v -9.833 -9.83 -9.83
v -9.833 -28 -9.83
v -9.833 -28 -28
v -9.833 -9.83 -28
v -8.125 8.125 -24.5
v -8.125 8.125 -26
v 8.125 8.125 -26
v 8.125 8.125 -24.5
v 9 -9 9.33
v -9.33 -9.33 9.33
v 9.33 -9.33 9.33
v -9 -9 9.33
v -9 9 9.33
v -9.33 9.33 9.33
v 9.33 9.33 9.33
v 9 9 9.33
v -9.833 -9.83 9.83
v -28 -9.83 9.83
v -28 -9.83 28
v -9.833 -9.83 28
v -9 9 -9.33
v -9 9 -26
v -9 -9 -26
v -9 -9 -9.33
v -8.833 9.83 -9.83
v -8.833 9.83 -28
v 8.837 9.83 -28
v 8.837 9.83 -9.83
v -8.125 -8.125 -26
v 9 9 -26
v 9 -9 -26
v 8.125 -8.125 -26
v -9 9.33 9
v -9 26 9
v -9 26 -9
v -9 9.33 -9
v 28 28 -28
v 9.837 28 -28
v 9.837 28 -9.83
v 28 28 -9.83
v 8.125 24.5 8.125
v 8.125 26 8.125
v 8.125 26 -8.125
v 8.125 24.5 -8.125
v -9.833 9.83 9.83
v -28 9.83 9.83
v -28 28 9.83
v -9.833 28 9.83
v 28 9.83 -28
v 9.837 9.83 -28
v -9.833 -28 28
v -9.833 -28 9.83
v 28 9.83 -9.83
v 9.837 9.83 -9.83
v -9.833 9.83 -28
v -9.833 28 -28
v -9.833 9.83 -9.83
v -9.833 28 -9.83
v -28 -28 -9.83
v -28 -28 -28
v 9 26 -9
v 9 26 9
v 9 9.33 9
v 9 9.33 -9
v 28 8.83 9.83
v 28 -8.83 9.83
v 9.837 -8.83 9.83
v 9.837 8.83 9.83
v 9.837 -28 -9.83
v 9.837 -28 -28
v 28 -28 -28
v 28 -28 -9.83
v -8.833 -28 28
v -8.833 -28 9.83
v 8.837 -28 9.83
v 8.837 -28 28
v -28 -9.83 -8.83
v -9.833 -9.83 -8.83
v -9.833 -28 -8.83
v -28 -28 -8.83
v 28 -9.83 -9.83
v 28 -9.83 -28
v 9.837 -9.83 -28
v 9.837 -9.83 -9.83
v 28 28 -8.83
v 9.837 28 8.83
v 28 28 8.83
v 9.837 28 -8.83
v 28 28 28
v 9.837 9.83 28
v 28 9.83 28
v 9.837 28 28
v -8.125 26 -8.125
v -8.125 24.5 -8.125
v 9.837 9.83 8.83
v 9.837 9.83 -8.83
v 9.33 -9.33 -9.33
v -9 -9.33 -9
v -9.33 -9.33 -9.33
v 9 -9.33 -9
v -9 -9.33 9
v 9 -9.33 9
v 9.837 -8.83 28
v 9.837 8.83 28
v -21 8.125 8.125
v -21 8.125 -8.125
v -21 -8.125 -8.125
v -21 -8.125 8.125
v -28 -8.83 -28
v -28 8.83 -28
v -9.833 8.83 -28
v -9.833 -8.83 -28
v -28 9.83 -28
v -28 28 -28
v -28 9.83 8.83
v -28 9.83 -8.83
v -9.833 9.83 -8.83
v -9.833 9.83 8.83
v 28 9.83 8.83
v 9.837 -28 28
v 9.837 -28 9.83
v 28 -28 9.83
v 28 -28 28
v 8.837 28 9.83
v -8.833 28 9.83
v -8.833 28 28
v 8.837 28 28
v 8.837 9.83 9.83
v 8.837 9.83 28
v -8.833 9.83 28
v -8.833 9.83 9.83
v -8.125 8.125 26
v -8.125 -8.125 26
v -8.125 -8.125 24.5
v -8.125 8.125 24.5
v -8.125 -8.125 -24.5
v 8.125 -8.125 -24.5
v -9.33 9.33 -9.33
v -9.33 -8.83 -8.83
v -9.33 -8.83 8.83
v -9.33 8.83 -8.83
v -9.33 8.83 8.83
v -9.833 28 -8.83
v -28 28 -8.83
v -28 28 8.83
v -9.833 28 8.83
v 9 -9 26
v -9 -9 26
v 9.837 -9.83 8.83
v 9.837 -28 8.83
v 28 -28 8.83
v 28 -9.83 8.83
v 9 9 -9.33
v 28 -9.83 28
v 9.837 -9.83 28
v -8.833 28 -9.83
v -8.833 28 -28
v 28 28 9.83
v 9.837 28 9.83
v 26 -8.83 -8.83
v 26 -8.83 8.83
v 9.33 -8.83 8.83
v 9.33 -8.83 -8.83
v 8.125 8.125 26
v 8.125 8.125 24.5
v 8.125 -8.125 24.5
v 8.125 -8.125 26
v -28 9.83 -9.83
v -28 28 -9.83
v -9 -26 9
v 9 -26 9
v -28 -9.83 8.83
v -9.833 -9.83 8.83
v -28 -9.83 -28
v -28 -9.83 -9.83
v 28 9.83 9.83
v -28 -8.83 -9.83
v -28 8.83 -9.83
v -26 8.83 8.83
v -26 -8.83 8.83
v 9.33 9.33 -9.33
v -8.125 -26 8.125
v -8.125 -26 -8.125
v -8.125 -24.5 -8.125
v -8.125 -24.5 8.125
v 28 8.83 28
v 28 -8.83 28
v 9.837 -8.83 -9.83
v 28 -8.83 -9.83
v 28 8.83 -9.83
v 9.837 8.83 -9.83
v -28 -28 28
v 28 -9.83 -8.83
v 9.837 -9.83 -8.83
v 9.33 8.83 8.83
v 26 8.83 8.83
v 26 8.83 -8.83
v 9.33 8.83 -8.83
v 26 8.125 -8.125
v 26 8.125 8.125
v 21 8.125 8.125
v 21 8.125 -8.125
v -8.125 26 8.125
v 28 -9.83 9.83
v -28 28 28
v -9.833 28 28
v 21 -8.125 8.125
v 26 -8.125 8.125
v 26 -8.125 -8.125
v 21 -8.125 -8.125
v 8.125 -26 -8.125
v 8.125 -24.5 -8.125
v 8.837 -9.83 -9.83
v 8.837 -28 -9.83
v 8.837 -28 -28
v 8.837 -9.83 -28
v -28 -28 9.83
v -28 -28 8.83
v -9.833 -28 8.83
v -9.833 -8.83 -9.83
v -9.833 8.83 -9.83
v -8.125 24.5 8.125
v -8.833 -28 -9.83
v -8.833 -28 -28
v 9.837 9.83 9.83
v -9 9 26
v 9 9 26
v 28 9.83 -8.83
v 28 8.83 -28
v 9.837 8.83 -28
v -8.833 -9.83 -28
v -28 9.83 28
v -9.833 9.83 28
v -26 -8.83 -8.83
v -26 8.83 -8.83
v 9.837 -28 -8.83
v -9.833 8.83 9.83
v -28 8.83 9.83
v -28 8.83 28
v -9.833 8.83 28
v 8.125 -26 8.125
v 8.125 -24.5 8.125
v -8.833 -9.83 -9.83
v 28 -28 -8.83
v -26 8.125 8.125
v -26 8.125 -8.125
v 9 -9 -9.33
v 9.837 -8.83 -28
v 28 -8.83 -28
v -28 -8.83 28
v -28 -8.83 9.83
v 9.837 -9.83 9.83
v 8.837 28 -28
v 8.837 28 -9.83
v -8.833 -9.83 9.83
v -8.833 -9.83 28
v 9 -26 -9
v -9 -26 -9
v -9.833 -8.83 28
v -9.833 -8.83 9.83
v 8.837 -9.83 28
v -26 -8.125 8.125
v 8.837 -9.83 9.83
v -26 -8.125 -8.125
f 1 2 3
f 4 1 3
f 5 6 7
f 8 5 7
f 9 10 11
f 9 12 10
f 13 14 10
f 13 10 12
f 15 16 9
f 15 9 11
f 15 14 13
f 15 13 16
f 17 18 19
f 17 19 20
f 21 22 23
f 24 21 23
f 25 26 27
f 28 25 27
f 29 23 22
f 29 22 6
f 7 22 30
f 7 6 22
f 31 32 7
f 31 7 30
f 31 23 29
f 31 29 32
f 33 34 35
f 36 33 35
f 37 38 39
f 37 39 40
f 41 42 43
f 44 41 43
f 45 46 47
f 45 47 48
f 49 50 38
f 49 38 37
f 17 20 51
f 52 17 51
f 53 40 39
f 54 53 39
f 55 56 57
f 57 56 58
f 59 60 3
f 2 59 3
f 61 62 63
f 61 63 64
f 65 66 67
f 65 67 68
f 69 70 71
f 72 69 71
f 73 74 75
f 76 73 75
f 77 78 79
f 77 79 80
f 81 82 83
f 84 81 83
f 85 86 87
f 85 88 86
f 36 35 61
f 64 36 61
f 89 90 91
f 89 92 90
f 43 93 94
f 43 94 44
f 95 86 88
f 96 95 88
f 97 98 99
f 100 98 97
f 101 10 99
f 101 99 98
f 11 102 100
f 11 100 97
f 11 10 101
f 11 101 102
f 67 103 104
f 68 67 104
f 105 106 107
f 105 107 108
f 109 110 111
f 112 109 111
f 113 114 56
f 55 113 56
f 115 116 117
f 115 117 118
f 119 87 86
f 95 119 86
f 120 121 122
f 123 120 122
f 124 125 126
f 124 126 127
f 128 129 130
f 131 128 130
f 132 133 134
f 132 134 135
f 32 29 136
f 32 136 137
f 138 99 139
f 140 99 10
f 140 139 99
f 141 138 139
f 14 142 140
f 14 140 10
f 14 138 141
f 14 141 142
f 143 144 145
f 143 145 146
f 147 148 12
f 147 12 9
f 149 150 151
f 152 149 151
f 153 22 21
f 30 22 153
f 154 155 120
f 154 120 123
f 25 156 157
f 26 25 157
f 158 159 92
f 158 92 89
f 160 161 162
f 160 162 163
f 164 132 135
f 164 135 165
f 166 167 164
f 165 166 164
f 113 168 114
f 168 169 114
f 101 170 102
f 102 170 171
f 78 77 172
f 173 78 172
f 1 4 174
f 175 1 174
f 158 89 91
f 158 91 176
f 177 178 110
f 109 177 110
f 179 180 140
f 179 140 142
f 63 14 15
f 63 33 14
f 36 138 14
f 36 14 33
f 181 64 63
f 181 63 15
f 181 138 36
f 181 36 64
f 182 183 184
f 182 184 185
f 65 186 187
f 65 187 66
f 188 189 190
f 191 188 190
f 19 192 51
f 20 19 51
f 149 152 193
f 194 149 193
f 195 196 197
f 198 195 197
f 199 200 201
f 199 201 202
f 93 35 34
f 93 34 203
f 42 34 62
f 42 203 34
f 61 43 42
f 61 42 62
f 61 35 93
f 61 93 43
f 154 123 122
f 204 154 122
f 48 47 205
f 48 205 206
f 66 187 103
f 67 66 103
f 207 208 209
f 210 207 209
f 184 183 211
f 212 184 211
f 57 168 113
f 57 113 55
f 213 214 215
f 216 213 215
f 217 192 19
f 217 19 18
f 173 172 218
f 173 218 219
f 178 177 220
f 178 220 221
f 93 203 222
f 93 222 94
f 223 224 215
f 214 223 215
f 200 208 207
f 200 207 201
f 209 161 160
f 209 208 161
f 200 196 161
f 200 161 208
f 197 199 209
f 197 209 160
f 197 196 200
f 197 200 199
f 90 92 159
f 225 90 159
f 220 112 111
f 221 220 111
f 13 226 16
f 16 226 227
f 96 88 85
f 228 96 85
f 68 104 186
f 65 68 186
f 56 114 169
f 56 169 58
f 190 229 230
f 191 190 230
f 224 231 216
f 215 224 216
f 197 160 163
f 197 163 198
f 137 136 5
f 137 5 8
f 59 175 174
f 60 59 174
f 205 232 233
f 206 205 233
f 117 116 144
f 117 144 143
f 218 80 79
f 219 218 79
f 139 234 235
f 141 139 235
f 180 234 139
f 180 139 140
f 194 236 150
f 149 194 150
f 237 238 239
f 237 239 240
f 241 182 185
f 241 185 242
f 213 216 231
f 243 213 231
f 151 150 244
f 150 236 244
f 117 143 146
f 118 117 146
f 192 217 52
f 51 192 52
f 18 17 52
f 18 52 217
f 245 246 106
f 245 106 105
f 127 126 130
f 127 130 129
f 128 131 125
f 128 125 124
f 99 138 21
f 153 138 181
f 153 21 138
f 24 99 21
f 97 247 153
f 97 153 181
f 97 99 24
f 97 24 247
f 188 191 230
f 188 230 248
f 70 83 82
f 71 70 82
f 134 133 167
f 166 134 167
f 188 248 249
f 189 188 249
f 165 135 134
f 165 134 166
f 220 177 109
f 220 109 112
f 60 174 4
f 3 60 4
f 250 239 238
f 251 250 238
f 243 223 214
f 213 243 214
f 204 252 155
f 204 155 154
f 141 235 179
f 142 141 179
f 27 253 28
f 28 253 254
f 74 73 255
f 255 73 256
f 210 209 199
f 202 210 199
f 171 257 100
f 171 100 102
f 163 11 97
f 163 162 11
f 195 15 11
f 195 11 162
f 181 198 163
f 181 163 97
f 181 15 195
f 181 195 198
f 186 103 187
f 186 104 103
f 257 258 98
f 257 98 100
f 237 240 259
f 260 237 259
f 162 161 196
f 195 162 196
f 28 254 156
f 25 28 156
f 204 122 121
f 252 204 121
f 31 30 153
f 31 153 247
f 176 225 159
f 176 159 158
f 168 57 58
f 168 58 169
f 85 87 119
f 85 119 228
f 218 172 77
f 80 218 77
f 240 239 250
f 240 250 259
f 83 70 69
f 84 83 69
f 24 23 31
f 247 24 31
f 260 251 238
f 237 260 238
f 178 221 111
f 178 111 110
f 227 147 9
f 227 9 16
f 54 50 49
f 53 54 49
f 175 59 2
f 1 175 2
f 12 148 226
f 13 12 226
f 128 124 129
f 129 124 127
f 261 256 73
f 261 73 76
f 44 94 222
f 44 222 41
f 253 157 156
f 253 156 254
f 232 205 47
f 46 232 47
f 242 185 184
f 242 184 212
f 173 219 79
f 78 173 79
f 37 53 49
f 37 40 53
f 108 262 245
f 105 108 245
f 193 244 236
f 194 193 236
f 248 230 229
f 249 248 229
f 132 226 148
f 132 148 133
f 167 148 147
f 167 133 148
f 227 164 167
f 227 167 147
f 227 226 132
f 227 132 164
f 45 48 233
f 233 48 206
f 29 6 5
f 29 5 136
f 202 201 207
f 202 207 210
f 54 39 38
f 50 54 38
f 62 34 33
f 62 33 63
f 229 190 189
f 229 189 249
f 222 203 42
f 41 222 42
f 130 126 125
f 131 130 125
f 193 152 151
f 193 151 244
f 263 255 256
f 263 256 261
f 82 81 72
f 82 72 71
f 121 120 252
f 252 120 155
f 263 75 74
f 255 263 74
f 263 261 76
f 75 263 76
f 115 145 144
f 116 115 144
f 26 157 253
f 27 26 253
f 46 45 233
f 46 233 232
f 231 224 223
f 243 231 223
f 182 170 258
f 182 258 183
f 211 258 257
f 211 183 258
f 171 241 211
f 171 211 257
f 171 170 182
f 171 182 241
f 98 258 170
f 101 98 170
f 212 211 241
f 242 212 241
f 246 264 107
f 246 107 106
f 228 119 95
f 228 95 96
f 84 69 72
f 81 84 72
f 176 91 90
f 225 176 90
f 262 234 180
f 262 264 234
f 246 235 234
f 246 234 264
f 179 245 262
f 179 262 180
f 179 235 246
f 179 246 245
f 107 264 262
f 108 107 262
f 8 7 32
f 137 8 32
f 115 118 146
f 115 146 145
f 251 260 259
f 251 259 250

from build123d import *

# Parameters (mm, degrees)
SKETCH1_W           = 56
SKETCH1_H           = 56
BOSS_EXTRUDE1_DEPTH = 28
SKETCH2_W           = 16.25
SKETCH2_H           = 16.25
CUT_EXTRUDE1_DEPTH  = 3.5
SKETCH2_3_W         = 18
SKETCH2_3_H         = 18
SKETCH2_3_W_2       = 16.25
SKETCH2_3_H_2       = 16.25
CUT_EXTRUDE6_DEPTH  = 2
SKETCH6_W           = 18
SKETCH6_H           = 18
CUT_EXTRUDE2_DEPTH  = 18.67
CIRPATTERN6_COUNT   = 4
SKETCH12_W          = 18
SKETCH12_H          = 18
SKETCH12_W_2        = 16.25
SKETCH12_H_2        = 16.25
CUT_EXTRUDE7_DEPTH  = 2
SKETCH12_3_W        = 16.25
SKETCH12_3_H        = 16.25
CUT_EXTRUDE8_DEPTH  = 7
SKETCH13_W          = 19.66
SKETCH13_H          = 19.66
SKETCH13_W_2        = 17.66
SKETCH13_H_2        = 17.66
CUT_EXTRUDE9_DEPTH  = 18.67
SKETCH14_W          = 18
SKETCH14_H          = 18
SKETCH14_W_2        = 16.25
SKETCH14_H_2        = 16.25
CUT_EXTRUDE10_DEPTH = 2
SKETCH14_2_W        = 16.25
SKETCH14_2_H        = 16.25
CUT_EXTRUDE11_DEPTH = 7
SKETCH15_W          = 19.66
SKETCH15_H          = 19.66
SKETCH15_W_2        = 17.66
SKETCH15_H_2        = 17.66
CUT_EXTRUDE12_DEPTH = 18.67


with BuildPart() as part:
    # Sketch1 → Boss-Extrude1 (new, symmetric)
    with BuildSketch(Plane(origin=(0, 0, 0), x_dir=(1, 0, 0), z_dir=(0, 1, 0))):
        Rectangle(SKETCH1_W, SKETCH1_H)
    extrude(amount=BOSS_EXTRUDE1_DEPTH, both=True)

    # Sketch2 → Cut-Extrude1 (cut, symmetric)
    with BuildSketch(Plane(origin=(0, 28, 0), x_dir=(1, 0, 0), z_dir=(0, 1, 0))):
        Rectangle(SKETCH2_W, SKETCH2_H)
    cut_extrude1 = extrude(amount=CUT_EXTRUDE1_DEPTH, both=True, mode=Mode.SUBTRACT)

    # Sketch2<3> → Cut-Extrude6 (cut)
    with BuildSketch(Plane(origin=(0, 28, 0), x_dir=(1, 0, 0), z_dir=(0, 1, 0))):
        Rectangle(SKETCH2_3_W, SKETCH2_3_H)
        Rectangle(SKETCH2_3_W_2, SKETCH2_3_H_2, mode=Mode.SUBTRACT)
    cut_extrude6 = extrude(amount=-CUT_EXTRUDE6_DEPTH, mode=Mode.SUBTRACT)

    # Sketch6 → Cut-Extrude2 (cut)
    with BuildSketch(Plane(origin=(0, 28, 0), x_dir=(1, 0, 0), z_dir=(0, 1, 0))):
        Polygon((-8.833333333, 28), (-9.833333333, 28), (-9.833333333, 9.83), (-28, 9.83), (-28, 8.83), (-9.833333333, 8.83), (-9.833333333, -8.83), (-28, -8.83), (-28, -9.83), (-9.833333333, -9.83), (-9.833333333, -28), (-8.833333333, -28), (-8.833333333, -9.83), (8.836666667, -9.83), (8.836666667, -28), (9.836666667, -28), (9.836666667, -9.83), (28, -9.83), (28, -8.83), (9.836666667, -8.83), (9.836666667, 8.83), (28, 8.83), (28, 9.83), (9.836666667, 9.83), (9.836666667, 28), (8.836666667, 28), (8.836666667, 9.83), (-8.833333333, 9.83), align=None)
        Rectangle(SKETCH6_W, SKETCH6_H, mode=Mode.SUBTRACT)
    cut_extrude2 = extrude(amount=-CUT_EXTRUDE2_DEPTH, mode=Mode.SUBTRACT)

    # CirPattern6: Cut-Extrude1, Cut-Extrude6, Cut-Extrude2 ×4 about axis
    cirpattern6_axis = Axis((0, 0, 0), (1, 0, 0))
    add([cut_extrude1.rotate(cirpattern6_axis, i * 360 / CIRPATTERN6_COUNT) for i in range(1, CIRPATTERN6_COUNT)], mode=Mode.SUBTRACT)
    add([cut_extrude6.rotate(cirpattern6_axis, i * 360 / CIRPATTERN6_COUNT) for i in range(1, CIRPATTERN6_COUNT)], mode=Mode.SUBTRACT)
    add([cut_extrude2.rotate(cirpattern6_axis, i * 360 / CIRPATTERN6_COUNT) for i in range(1, CIRPATTERN6_COUNT)], mode=Mode.SUBTRACT)

    # Sketch12 → Cut-Extrude7 (cut)
    with BuildSketch(Plane.ZY.offset(28)):
        Rectangle(SKETCH12_W, SKETCH12_H)
        Rectangle(SKETCH12_W_2, SKETCH12_H_2, mode=Mode.SUBTRACT)
    extrude(amount=-CUT_EXTRUDE7_DEPTH, mode=Mode.SUBTRACT)

    # Sketch12<3> → Cut-Extrude8 (cut)
    with BuildSketch(Plane.ZY.offset(28)):
        Rectangle(SKETCH12_3_W, SKETCH12_3_H)
    extrude(amount=-CUT_EXTRUDE8_DEPTH, mode=Mode.SUBTRACT)

    # Sketch13 → Cut-Extrude9 (cut)
    with BuildSketch(Plane.ZY.offset(28)):
        Rectangle(SKETCH13_W, SKETCH13_H)
        Rectangle(SKETCH13_W_2, SKETCH13_H_2, mode=Mode.SUBTRACT)
    extrude(amount=-CUT_EXTRUDE9_DEPTH, mode=Mode.SUBTRACT)

    # Sketch14 → Cut-Extrude10 (cut)
    with BuildSketch(Plane(origin=(28, 0, 0), x_dir=(0, 0, -1), z_dir=(1, 0, 0))):
        Rectangle(SKETCH14_W, SKETCH14_H)
        Rectangle(SKETCH14_W_2, SKETCH14_H_2, mode=Mode.SUBTRACT)
    extrude(amount=-CUT_EXTRUDE10_DEPTH, mode=Mode.SUBTRACT)

    # Sketch14<2> → Cut-Extrude11 (cut)
    with BuildSketch(Plane(origin=(28, 0, 0), x_dir=(0, 0, -1), z_dir=(1, 0, 0))):
        Rectangle(SKETCH14_2_W, SKETCH14_2_H)
    extrude(amount=-CUT_EXTRUDE11_DEPTH, mode=Mode.SUBTRACT)

    # Sketch15 → Cut-Extrude12 (cut)
    with BuildSketch(Plane(origin=(28, 0, 0), x_dir=(0, 0, -1), z_dir=(1, 0, 0))):
        Rectangle(SKETCH15_W, SKETCH15_H)
        Rectangle(SKETCH15_W_2, SKETCH15_H_2, mode=Mode.SUBTRACT)
    extrude(amount=-CUT_EXTRUDE12_DEPTH, mode=Mode.SUBTRACT)


solid = part.part
